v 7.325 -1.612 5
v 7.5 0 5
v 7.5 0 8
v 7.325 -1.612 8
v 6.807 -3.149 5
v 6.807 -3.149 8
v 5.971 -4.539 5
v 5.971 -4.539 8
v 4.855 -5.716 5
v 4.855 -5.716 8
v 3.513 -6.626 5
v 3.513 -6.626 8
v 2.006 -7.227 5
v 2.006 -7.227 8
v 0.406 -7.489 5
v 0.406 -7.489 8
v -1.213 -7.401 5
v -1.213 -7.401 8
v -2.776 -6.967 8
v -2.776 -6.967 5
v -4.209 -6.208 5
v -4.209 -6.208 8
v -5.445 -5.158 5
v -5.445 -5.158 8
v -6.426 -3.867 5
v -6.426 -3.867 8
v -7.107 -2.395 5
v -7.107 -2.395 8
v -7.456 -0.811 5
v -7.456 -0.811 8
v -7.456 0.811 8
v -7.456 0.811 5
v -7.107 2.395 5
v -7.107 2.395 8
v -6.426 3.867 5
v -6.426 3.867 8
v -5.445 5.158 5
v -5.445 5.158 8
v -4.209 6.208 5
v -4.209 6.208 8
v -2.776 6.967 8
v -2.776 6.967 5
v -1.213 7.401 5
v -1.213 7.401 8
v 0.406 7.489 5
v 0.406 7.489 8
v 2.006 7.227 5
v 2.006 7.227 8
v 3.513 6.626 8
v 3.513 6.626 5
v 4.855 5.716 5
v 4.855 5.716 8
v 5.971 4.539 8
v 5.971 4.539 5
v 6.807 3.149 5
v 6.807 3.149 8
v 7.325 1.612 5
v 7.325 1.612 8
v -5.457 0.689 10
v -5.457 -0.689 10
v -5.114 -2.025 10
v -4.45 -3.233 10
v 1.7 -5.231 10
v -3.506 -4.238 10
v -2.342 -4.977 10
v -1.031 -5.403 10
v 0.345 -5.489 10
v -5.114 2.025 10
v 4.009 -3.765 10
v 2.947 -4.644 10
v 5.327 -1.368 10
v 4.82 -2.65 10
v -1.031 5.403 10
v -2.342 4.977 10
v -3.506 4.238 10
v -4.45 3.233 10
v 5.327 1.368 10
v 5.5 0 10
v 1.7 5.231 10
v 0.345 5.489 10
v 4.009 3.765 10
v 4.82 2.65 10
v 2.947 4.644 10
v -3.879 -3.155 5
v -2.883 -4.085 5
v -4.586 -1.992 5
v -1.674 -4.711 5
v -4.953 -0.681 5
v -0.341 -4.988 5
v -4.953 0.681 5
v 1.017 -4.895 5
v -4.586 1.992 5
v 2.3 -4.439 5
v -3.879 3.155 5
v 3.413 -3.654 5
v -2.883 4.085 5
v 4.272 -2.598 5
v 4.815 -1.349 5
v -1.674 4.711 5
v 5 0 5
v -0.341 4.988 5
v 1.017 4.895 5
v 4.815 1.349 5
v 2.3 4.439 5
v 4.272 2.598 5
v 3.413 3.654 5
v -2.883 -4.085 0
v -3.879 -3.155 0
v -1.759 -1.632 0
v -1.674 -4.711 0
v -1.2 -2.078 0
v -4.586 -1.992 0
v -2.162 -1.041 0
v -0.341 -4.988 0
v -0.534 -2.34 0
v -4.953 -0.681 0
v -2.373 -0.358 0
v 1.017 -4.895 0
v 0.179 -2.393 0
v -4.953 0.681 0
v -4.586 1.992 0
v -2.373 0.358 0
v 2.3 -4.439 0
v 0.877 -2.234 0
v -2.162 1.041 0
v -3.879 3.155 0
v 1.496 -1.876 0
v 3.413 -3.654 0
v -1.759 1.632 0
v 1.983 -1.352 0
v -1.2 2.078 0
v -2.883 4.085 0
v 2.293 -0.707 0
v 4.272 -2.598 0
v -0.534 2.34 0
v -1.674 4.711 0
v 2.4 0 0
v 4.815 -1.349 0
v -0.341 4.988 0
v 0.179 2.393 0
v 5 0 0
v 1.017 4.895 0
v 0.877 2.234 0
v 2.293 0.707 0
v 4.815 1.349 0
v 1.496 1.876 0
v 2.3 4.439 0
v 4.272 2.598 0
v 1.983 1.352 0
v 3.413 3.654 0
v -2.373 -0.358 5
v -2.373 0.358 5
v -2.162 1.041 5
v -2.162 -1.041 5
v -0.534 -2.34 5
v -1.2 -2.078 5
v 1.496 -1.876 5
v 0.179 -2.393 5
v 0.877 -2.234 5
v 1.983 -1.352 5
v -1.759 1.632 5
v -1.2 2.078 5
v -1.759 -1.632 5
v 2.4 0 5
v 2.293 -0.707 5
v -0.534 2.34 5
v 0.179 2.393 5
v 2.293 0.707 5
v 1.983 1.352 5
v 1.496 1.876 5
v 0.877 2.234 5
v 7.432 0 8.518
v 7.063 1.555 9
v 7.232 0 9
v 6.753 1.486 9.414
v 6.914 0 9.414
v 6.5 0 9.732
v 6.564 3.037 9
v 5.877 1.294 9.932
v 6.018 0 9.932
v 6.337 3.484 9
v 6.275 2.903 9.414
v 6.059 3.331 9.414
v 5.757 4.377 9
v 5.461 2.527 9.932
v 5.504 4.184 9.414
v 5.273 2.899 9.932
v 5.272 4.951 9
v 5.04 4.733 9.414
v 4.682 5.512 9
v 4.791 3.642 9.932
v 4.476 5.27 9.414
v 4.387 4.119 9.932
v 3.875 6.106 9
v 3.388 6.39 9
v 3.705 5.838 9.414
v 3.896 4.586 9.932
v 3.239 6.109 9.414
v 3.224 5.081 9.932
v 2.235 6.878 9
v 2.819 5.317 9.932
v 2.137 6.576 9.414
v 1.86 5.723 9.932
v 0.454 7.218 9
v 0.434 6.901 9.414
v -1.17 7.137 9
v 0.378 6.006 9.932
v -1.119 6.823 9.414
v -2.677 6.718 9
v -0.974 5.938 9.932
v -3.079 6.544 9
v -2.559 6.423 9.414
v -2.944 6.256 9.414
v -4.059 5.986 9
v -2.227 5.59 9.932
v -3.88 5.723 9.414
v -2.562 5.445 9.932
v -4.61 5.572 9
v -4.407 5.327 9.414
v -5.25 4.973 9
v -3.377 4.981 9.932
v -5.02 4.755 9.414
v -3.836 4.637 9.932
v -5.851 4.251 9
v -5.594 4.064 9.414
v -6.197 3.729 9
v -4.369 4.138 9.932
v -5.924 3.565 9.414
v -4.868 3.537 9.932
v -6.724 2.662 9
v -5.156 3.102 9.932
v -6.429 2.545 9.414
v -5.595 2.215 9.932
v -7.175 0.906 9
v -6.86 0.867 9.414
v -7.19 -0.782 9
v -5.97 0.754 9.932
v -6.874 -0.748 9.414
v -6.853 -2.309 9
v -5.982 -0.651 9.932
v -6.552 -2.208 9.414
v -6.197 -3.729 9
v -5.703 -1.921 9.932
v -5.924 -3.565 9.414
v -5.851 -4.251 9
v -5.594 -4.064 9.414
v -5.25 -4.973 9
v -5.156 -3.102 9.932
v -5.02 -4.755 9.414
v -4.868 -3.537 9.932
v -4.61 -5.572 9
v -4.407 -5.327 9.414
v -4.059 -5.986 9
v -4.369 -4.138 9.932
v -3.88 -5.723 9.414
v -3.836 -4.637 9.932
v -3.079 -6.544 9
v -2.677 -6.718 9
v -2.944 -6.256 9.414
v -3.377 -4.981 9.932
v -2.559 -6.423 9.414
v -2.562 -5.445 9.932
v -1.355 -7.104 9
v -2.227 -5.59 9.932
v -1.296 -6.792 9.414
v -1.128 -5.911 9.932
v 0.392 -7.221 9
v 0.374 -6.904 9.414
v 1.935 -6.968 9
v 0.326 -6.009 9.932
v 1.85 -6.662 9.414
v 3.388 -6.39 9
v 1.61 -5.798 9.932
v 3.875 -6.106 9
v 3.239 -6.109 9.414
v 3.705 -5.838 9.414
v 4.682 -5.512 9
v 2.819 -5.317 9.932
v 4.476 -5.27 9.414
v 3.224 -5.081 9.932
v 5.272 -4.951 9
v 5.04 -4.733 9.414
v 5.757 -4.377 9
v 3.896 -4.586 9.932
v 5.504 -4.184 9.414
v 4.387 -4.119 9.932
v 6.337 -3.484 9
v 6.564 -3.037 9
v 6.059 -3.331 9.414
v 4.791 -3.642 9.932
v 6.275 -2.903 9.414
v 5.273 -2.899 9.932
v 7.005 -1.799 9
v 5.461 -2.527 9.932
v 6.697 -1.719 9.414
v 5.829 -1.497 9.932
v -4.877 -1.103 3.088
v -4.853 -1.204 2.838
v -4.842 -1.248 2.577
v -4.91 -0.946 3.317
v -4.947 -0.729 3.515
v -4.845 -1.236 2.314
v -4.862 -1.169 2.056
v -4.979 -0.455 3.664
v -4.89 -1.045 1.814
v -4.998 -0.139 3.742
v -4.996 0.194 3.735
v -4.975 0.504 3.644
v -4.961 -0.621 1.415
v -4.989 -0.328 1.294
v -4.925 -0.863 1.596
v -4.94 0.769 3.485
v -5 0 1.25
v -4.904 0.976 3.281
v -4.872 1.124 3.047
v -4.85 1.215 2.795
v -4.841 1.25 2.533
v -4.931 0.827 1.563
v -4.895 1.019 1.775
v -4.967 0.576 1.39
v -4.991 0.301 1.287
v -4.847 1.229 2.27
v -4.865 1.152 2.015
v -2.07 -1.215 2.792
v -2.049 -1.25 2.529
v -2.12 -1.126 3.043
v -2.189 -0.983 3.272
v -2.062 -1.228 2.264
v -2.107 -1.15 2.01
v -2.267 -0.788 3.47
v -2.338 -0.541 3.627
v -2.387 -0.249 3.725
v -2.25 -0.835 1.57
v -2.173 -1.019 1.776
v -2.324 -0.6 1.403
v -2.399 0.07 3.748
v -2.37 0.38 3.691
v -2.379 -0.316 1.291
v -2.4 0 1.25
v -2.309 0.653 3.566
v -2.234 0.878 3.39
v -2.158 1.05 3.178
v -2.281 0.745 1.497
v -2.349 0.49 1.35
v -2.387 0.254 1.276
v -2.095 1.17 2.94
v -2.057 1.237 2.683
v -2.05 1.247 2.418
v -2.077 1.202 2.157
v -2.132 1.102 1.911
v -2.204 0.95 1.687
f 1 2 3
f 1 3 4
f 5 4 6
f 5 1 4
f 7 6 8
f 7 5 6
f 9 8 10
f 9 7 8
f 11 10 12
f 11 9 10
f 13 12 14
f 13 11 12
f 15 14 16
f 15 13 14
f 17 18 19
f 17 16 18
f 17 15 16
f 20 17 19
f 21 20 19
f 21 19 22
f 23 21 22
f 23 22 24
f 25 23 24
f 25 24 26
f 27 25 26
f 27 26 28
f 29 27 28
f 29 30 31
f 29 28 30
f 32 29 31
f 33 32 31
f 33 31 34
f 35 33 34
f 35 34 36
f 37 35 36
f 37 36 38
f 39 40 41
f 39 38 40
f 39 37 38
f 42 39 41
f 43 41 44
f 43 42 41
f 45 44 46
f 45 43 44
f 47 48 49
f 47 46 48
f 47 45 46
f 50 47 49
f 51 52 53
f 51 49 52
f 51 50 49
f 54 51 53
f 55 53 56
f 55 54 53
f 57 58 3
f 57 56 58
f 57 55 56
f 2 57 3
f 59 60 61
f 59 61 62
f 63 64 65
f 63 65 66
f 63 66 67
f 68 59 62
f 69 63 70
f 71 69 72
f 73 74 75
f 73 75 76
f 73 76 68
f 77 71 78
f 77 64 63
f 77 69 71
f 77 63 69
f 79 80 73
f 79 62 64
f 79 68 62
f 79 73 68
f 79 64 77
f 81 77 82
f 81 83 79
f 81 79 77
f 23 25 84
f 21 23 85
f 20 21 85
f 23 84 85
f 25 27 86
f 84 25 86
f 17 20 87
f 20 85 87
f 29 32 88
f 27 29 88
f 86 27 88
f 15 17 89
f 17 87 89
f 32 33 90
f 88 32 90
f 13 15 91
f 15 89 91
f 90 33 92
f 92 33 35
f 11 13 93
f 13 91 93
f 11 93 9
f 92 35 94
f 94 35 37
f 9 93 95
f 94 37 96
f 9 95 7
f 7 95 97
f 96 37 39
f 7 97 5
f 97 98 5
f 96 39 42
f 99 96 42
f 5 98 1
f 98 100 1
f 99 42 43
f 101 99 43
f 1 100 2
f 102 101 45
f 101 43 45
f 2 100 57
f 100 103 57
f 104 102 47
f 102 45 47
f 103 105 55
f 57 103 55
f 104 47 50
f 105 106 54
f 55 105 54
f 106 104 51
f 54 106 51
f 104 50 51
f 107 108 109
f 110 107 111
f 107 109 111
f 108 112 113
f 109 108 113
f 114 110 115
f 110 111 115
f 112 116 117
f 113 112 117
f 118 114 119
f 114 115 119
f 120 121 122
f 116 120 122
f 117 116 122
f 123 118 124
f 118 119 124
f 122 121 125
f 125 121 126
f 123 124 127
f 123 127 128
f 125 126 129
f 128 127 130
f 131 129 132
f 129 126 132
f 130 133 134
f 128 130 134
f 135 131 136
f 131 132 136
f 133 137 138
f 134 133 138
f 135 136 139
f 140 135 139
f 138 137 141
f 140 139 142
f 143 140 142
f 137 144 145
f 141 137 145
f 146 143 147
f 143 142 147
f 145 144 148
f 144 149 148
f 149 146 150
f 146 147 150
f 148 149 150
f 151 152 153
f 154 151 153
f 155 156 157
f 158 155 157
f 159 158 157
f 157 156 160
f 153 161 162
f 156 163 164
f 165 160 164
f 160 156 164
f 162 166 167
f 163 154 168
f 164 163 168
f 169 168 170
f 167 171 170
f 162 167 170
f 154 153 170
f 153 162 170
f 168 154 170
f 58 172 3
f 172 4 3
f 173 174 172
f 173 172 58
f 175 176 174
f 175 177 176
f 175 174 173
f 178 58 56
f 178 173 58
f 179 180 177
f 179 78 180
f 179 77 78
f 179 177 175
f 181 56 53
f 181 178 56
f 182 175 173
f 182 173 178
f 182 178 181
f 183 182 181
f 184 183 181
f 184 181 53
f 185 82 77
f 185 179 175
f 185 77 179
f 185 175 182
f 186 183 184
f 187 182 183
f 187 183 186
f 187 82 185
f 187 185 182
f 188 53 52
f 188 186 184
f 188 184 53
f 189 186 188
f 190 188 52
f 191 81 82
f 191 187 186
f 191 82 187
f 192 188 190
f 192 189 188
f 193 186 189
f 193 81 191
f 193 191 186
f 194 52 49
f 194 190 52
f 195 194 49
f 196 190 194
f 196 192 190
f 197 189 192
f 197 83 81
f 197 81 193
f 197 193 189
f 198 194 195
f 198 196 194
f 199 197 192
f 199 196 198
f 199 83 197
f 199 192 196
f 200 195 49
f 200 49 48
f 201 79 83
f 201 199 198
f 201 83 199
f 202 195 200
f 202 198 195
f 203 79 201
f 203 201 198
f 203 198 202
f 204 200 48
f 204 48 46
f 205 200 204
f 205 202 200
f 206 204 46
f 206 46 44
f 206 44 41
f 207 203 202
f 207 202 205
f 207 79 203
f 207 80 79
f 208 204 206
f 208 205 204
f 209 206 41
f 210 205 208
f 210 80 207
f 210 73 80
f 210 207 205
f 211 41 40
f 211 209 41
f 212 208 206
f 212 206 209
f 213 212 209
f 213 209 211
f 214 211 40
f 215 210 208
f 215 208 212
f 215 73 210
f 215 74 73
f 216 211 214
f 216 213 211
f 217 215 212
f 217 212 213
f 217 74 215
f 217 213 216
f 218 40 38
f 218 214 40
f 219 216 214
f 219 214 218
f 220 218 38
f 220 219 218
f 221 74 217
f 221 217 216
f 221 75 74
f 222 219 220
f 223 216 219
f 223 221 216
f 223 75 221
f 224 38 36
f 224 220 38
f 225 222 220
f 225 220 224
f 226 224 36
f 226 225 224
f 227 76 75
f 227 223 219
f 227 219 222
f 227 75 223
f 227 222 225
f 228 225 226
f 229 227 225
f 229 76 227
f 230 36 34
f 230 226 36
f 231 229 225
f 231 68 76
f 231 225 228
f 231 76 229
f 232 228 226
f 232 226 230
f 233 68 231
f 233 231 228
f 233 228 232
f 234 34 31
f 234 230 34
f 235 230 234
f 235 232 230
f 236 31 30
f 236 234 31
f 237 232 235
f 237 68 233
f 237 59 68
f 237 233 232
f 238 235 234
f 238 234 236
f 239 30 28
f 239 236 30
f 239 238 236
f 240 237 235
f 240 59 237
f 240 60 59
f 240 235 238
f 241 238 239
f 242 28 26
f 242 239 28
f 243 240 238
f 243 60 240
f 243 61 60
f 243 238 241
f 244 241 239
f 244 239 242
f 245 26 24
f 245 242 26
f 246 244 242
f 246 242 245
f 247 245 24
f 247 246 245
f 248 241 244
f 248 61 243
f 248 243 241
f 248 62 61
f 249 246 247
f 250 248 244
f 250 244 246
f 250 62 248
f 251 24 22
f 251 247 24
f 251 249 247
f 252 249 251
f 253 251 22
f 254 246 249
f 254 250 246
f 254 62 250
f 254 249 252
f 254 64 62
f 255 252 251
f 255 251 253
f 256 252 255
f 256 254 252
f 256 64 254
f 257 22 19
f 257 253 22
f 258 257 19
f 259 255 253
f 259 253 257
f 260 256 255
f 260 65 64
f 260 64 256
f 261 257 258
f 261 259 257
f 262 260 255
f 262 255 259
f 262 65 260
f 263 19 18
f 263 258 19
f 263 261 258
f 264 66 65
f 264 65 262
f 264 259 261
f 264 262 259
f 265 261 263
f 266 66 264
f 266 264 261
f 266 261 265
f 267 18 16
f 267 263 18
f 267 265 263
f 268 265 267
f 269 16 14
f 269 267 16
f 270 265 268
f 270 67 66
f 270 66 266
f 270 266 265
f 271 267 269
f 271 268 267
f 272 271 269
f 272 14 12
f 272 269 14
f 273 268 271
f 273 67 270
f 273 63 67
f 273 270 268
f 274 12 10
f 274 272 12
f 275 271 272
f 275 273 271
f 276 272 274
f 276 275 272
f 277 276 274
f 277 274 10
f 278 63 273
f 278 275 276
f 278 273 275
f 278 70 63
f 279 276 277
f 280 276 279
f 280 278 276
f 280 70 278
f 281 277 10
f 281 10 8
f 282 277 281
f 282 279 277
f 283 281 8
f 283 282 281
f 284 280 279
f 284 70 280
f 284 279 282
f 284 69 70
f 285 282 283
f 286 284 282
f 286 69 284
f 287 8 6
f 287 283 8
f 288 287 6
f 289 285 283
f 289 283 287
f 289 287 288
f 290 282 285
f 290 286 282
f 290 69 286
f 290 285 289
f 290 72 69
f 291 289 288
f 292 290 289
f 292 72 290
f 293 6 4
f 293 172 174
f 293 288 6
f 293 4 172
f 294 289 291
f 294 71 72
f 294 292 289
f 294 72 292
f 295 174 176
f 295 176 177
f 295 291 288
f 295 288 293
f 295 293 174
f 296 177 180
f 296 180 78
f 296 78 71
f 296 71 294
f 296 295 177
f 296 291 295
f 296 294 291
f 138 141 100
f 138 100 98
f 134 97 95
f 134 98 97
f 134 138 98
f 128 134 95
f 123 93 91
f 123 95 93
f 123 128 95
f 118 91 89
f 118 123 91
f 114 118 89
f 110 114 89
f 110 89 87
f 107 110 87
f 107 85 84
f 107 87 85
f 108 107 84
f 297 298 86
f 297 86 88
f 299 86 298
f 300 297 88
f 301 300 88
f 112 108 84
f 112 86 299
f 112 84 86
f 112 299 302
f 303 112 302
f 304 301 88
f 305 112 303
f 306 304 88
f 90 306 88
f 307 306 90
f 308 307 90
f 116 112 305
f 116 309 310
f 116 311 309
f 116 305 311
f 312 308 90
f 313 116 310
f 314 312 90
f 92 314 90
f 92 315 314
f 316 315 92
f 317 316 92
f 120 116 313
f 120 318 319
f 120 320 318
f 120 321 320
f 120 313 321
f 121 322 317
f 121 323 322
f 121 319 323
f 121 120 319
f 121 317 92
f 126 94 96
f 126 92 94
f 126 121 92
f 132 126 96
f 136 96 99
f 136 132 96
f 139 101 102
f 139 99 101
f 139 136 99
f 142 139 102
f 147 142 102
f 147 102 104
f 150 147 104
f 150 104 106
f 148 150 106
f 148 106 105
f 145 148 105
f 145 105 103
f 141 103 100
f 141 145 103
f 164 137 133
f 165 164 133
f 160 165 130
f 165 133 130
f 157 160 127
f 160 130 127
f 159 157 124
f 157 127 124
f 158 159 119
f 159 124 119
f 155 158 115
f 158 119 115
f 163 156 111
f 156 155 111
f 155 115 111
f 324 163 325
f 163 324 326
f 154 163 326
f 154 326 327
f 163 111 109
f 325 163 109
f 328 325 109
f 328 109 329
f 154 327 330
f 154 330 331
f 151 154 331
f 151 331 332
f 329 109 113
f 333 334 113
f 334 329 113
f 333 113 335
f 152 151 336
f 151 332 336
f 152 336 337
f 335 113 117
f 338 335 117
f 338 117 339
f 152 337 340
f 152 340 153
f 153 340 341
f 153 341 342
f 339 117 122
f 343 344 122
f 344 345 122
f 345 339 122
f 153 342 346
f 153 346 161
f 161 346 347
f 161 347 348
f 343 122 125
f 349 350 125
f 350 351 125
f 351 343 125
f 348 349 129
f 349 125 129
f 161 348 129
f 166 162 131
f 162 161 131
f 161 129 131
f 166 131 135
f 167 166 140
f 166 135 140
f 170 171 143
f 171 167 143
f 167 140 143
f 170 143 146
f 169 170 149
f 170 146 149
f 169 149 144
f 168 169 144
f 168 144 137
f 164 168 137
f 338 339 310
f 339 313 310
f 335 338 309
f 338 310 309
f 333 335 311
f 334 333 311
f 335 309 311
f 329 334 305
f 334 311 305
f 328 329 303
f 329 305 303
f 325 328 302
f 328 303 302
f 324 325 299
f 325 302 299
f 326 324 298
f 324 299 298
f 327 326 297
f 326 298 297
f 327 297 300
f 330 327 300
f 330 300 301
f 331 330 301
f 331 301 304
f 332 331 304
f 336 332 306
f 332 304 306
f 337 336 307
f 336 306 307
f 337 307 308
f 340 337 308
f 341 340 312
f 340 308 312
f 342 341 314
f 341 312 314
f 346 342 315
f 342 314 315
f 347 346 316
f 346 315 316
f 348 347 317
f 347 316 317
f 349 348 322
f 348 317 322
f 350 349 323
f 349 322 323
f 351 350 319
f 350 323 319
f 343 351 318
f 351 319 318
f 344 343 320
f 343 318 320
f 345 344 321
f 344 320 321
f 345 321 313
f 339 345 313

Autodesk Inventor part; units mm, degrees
ref_plane "YZ Plane" through (0, 0, 0) normal (1, 0, 0) x (0, 1, 0)
ref_plane "XZ Plane" through (0, 0, 0) normal (0, 1, 0) x (-1, 0, 0)
ref_plane "XY Plane" through (0, 0, 0) normal (0, 0, 1) x (1, 0, 0)
sketch "Sketch1" plane through (0, 0, 0) normal (0, 0, 1) x (1, 0, 0)
  circle A0 centre (0, 0) radius 2.4
  circle A1 centre (0, 0) radius 5
  dimension "d0" = 4.8
  dimension "d1" = 10
extrude "Extrusion1" add sketch "Sketch1" along normal blind 5
sketch "Sketch2" plane through (0, 0, 5) normal (0, 0, 1) x (1, 0, 0)
  circle A0 centre (0, 0) radius 7.5
  dimension "d4" = 15
extrude "Extrusion2" add sketch "Sketch2" along normal blind 5
fillet "Fillet1" radius 2 1 edges at (-7.5, 0, 10)
sketch "Sketch3" plane through (0, 0, 0) normal (1, 0, 0) x (0, 1, 0)
  line L0 (5, 0) -> (-5, 0) projected
  point P0 (0, 0)
  point P1 (0, 2.5)
  dimension "d8" = 2.5
hole "Hole1" at (0, 0, 2.5) direction (-1, 0, 0) diameter 2.5 end through all
properties part number "10-03-011 Ciuperca"
